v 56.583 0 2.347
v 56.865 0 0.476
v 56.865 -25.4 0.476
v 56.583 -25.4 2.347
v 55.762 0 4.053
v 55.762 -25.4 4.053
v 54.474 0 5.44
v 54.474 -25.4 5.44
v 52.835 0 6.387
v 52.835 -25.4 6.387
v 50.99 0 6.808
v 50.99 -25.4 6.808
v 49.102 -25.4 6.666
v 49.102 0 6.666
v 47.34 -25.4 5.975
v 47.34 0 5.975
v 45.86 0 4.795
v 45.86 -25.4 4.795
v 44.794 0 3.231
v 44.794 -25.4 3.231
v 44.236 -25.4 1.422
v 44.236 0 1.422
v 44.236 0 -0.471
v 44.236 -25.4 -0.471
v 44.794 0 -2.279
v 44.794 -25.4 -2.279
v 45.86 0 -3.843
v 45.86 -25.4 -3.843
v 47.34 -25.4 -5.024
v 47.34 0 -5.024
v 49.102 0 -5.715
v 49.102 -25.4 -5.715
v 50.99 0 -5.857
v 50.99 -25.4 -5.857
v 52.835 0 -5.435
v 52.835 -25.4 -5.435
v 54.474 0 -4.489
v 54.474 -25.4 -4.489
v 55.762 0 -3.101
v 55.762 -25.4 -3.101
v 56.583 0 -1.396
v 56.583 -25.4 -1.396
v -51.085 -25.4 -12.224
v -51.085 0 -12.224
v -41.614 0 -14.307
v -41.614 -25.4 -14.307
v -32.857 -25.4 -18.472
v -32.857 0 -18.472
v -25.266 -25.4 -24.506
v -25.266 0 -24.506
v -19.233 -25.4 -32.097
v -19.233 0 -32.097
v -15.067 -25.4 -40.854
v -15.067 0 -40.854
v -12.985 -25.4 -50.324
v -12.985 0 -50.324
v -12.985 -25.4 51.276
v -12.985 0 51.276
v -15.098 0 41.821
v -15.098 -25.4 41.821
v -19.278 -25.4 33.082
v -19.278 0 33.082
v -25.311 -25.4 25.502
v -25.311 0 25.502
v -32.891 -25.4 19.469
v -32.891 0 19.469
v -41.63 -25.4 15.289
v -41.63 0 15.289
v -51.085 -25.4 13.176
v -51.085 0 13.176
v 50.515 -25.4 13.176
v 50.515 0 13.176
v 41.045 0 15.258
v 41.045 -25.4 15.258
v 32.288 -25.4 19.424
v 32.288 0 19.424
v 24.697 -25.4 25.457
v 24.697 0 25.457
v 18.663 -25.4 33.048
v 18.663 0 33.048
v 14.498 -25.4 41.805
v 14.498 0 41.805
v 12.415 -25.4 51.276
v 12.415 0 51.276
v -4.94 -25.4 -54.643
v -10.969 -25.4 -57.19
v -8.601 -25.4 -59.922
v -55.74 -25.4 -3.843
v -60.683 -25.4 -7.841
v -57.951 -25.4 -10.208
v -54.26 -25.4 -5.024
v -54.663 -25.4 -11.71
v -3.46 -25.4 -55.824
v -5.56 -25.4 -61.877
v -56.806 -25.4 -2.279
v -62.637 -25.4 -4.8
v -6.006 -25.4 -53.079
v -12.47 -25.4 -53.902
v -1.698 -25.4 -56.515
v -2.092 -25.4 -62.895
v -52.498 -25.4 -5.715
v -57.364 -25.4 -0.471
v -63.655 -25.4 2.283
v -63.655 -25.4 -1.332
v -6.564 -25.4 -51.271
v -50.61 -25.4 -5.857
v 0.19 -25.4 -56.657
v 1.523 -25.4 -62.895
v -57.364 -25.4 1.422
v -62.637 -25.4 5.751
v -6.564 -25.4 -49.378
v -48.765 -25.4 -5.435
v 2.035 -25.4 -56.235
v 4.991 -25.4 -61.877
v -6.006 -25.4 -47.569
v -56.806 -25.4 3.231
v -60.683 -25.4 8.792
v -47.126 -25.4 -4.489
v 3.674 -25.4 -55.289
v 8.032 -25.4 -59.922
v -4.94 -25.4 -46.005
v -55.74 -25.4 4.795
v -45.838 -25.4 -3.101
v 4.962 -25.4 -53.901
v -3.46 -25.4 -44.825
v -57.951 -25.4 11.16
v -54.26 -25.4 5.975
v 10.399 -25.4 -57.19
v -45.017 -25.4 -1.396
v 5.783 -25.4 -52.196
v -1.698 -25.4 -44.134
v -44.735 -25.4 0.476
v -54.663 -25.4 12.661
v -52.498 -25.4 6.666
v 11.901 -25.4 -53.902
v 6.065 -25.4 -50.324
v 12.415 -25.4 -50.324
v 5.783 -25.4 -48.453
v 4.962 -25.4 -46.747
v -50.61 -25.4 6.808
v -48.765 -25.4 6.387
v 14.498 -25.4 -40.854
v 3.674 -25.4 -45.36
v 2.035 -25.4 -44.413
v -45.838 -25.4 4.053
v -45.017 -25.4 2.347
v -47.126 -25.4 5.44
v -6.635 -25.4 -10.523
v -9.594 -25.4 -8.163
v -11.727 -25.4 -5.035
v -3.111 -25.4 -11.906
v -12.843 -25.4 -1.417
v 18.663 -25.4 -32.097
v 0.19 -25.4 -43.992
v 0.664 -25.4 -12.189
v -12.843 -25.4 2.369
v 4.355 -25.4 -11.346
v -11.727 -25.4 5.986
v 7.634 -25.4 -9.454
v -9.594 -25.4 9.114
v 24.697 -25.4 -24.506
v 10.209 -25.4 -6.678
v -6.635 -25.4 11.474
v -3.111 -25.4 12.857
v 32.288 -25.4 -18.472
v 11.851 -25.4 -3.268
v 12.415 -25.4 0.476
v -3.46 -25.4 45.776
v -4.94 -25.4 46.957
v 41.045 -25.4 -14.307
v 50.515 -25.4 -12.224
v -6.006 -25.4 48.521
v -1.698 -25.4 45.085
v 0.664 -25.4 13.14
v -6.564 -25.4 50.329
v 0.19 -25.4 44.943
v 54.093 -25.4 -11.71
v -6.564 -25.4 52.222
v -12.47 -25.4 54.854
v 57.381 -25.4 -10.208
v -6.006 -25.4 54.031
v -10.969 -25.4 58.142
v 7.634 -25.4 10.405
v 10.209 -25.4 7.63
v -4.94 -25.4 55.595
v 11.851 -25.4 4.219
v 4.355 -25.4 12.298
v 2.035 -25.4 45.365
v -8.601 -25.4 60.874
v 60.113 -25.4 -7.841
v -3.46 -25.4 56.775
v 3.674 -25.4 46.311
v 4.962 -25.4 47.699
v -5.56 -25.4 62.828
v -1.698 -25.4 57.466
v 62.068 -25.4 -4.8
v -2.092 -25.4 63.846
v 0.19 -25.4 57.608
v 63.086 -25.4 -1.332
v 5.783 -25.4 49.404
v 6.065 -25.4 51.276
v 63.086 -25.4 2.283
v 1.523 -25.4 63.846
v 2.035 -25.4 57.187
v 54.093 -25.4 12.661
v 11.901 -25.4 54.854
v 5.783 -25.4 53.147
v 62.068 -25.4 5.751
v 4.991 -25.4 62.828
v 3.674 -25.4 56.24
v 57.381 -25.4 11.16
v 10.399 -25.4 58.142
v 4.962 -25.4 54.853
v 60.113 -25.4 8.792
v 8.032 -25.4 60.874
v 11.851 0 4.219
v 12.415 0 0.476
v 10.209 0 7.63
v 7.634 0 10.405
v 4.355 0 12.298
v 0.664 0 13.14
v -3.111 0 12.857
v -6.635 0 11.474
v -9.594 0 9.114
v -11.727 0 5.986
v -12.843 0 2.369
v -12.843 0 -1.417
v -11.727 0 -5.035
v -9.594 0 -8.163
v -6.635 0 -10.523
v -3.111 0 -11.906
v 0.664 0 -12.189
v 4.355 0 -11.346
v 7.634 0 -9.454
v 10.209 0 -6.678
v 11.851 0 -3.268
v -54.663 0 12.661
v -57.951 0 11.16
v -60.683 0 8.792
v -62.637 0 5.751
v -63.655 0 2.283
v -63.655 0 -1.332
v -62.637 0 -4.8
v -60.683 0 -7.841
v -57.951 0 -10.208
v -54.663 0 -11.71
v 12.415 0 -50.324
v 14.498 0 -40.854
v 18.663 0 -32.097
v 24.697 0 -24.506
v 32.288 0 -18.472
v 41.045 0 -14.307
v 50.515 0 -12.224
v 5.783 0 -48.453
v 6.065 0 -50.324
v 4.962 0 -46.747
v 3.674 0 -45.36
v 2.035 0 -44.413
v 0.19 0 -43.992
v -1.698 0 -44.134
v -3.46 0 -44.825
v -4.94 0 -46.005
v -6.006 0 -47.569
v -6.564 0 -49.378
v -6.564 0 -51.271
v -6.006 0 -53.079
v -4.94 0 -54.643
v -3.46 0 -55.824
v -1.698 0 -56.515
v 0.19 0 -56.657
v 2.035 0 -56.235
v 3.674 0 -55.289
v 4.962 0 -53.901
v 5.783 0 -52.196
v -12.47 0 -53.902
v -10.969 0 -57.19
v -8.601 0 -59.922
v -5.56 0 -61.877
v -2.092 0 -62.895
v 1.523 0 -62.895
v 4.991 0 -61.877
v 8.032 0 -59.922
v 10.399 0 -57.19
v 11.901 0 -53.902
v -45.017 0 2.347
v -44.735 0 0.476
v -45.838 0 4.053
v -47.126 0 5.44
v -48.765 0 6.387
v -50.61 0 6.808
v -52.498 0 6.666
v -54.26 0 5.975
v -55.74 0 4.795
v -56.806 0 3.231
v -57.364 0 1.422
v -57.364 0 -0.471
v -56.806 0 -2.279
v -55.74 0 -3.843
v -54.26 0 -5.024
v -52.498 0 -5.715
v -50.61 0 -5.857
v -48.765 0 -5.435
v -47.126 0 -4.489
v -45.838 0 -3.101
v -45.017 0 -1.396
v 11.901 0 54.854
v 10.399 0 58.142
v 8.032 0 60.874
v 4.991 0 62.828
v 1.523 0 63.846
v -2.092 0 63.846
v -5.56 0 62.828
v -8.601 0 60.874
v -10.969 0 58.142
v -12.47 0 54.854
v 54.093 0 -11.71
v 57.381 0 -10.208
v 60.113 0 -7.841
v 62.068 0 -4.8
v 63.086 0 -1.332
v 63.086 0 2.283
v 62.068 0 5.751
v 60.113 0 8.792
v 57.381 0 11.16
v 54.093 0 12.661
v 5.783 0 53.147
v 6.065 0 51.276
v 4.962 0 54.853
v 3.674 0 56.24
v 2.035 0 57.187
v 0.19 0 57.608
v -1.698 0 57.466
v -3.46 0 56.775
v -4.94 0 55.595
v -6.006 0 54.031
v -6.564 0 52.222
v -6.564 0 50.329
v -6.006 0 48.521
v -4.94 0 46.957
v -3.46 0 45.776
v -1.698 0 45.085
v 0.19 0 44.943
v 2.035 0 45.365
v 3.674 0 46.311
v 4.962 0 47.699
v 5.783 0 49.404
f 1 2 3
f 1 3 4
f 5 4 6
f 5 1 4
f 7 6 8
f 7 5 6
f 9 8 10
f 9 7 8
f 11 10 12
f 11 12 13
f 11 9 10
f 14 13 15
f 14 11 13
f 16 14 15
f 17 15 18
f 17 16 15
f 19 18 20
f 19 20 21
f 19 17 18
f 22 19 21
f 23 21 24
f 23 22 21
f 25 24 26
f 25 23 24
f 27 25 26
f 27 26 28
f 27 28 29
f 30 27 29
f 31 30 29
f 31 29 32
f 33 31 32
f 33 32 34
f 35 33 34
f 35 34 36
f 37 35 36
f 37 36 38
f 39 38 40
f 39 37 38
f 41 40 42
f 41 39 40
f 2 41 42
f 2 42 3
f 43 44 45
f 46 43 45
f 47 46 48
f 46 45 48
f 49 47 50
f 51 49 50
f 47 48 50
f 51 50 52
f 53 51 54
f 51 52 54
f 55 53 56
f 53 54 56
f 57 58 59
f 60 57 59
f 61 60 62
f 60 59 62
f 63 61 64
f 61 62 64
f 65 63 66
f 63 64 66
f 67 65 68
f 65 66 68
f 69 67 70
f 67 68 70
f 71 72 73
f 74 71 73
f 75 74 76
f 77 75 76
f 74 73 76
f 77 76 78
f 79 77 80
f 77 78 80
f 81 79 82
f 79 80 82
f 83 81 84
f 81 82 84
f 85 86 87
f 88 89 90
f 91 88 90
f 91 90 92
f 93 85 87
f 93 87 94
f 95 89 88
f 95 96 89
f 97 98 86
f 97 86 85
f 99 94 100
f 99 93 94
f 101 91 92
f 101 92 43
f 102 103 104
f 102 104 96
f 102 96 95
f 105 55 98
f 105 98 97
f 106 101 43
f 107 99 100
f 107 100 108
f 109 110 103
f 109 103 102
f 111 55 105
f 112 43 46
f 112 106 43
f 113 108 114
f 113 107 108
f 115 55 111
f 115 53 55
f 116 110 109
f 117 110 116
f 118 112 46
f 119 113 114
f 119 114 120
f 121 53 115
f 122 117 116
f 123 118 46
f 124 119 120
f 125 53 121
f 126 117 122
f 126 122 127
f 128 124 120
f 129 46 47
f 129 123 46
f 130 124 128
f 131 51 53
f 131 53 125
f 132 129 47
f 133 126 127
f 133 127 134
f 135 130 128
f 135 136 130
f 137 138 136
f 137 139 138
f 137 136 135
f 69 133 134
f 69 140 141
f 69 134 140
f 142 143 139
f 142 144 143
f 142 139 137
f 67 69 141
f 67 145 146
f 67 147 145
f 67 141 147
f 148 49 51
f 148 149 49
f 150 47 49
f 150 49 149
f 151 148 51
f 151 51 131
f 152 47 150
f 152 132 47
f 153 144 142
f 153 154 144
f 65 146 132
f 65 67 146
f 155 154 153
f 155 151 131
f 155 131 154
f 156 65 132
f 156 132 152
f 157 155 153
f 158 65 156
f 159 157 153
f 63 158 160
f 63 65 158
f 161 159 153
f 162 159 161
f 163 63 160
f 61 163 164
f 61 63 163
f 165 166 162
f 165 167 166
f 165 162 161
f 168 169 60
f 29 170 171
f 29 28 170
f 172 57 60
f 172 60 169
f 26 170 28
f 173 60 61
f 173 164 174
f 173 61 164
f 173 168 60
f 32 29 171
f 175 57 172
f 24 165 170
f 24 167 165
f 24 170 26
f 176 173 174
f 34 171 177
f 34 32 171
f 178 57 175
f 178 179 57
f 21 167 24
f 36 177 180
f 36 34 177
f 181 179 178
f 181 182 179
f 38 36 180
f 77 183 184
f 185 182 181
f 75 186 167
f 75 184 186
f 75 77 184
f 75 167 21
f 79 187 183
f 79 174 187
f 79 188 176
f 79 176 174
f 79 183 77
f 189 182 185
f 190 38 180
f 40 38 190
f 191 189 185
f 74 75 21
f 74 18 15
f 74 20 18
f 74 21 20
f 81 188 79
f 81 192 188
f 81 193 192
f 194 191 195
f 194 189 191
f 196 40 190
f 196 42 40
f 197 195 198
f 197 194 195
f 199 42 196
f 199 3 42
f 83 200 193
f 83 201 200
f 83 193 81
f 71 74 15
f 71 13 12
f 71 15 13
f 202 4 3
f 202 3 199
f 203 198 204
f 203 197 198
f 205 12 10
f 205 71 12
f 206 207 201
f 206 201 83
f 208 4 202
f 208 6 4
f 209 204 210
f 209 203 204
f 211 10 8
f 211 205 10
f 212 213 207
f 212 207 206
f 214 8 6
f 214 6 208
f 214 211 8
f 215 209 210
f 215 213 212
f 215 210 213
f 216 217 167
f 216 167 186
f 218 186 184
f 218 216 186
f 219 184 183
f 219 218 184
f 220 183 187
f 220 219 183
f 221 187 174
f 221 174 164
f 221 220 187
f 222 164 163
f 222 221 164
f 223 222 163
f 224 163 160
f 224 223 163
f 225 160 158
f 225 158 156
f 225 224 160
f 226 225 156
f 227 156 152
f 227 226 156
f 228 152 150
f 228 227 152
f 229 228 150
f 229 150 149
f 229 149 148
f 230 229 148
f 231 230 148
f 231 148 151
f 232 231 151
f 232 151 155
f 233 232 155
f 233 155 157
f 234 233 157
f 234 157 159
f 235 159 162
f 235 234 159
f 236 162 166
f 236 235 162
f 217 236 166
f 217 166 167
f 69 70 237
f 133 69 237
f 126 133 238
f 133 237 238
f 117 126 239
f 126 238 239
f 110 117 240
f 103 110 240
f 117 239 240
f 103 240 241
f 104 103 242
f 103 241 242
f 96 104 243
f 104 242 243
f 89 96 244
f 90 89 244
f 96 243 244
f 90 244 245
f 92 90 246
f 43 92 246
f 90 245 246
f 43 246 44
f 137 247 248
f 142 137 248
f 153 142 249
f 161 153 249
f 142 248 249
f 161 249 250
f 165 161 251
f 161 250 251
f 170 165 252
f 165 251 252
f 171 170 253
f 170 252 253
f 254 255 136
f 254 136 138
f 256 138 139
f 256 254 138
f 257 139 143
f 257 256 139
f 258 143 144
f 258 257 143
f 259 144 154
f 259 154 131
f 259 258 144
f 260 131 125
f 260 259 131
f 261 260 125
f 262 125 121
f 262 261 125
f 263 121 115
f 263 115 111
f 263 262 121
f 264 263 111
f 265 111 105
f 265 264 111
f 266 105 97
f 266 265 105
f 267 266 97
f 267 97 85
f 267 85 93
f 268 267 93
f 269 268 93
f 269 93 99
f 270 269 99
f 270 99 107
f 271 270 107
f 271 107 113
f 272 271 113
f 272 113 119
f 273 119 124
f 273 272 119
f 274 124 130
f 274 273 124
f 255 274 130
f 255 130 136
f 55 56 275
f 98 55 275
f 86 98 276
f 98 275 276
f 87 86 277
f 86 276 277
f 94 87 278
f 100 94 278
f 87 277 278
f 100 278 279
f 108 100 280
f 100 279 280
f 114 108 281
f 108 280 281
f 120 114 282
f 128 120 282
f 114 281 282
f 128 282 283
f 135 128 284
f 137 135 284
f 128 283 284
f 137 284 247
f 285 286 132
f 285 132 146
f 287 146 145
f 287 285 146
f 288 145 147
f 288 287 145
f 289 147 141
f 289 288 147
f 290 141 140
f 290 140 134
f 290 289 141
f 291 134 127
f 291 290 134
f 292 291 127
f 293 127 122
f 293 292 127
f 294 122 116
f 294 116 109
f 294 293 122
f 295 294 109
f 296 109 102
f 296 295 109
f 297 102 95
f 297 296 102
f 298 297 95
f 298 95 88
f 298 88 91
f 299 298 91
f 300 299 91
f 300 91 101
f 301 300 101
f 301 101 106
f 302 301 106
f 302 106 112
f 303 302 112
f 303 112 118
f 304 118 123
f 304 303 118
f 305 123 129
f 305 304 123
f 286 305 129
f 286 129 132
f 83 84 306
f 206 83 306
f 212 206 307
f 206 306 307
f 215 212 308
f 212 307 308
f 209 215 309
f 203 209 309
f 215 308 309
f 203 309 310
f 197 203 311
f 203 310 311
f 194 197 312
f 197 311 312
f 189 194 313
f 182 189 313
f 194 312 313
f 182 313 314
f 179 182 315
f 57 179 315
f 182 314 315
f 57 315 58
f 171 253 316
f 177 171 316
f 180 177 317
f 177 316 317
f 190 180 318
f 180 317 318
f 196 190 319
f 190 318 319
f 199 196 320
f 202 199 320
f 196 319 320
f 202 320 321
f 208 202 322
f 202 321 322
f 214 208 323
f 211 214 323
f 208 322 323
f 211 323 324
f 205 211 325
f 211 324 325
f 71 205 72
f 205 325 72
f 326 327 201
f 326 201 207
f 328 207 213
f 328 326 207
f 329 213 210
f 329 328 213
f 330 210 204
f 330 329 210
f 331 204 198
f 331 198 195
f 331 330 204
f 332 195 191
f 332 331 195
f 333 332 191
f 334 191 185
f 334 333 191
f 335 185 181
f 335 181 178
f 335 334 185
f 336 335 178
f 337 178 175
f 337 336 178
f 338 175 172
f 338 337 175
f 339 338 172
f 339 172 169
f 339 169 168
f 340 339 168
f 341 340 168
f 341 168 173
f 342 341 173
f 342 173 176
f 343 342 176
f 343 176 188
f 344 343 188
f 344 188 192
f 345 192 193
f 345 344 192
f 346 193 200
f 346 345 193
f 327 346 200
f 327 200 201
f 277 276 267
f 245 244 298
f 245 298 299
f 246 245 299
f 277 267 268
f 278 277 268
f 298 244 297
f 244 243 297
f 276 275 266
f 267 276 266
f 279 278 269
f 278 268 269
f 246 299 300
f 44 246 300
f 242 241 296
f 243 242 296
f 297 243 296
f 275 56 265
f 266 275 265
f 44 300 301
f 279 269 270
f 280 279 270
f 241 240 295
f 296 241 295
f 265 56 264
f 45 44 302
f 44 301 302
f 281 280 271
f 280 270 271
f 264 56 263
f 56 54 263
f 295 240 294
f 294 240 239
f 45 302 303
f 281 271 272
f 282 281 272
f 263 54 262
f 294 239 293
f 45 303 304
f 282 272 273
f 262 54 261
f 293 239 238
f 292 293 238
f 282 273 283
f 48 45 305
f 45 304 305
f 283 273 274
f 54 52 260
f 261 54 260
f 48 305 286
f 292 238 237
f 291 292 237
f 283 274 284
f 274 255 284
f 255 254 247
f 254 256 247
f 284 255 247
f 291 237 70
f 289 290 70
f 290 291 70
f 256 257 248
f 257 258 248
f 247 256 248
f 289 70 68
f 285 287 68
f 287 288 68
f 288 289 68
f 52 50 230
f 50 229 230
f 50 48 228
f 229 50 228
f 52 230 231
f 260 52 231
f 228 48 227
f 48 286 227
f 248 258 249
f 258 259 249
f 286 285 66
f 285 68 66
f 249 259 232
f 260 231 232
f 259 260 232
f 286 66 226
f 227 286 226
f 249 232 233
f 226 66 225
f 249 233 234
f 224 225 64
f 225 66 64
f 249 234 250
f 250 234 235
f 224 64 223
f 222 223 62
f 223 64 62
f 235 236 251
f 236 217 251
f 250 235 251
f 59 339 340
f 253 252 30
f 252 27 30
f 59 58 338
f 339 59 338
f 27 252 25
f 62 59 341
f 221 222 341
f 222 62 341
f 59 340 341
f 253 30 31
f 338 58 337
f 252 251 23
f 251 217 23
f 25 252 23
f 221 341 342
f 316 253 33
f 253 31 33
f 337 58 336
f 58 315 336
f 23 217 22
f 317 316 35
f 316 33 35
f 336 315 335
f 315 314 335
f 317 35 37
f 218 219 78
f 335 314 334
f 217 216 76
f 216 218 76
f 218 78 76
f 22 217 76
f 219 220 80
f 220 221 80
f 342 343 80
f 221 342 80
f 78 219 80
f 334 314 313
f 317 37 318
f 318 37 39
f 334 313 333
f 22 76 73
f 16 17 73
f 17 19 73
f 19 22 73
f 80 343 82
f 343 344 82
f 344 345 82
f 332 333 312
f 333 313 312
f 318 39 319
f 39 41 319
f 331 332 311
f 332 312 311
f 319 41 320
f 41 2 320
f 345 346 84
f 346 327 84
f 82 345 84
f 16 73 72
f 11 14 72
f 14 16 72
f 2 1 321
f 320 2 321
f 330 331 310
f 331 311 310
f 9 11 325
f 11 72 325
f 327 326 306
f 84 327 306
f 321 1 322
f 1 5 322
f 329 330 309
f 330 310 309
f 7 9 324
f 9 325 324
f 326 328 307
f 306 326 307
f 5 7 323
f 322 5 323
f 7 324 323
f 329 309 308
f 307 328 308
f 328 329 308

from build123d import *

# Parameters (mm, degrees)
F0_R     = 6.35
F0_R_2   = 12.7
F1_DEPTH = 25.4


with BuildPart() as f1:
    # F0 (on Front) → F1 (new body)
    with BuildSketch(Plane.XZ):
        with BuildLine():
            ThreePointArc((-12.984713, 51.275665), (-25.311381, 25.502333), (-51.084713, 13.175665))
            ThreePointArc((-51.084713, 13.175665), (-63.784713, 0.475665), (-51.084713, -12.224335))
            ThreePointArc((-51.084713, -12.224335), (-25.266476, -24.506099), (-12.984713, -50.324335))
            ThreePointArc((-12.984713, -50.324335), (-0.284713, -63.024335), (12.415287, -50.324335))
            ThreePointArc((12.415287, -50.324335), (24.697063, -24.506111), (50.515287, -12.224335))
            ThreePointArc((50.515287, -12.224335), (63.215287, 0.475665), (50.515287, 13.175665))
            ThreePointArc((50.515287, 13.175665), (24.697074, 25.457452), (12.415287, 51.275665))
            ThreePointArc((12.415287, 51.275665), (-0.284713, 63.975665), (-12.984713, 51.275665))
        make_face()
        with Locations((-0.284713, -50.324335)):
            Circle(F0_R, mode=Mode.SUBTRACT)
        with Locations((-51.084713, 0.475665)):
            Circle(F0_R, mode=Mode.SUBTRACT)
        with Locations((-0.284713, 0.475665)):
            Circle(F0_R_2, mode=Mode.SUBTRACT)
        with Locations((-0.284713, 51.275665)):
            Circle(F0_R, mode=Mode.SUBTRACT)
        with Locations((50.515287, 0.475665)):
            Circle(F0_R, mode=Mode.SUBTRACT)
    extrude(amount=F1_DEPTH)


solid = f1.part
